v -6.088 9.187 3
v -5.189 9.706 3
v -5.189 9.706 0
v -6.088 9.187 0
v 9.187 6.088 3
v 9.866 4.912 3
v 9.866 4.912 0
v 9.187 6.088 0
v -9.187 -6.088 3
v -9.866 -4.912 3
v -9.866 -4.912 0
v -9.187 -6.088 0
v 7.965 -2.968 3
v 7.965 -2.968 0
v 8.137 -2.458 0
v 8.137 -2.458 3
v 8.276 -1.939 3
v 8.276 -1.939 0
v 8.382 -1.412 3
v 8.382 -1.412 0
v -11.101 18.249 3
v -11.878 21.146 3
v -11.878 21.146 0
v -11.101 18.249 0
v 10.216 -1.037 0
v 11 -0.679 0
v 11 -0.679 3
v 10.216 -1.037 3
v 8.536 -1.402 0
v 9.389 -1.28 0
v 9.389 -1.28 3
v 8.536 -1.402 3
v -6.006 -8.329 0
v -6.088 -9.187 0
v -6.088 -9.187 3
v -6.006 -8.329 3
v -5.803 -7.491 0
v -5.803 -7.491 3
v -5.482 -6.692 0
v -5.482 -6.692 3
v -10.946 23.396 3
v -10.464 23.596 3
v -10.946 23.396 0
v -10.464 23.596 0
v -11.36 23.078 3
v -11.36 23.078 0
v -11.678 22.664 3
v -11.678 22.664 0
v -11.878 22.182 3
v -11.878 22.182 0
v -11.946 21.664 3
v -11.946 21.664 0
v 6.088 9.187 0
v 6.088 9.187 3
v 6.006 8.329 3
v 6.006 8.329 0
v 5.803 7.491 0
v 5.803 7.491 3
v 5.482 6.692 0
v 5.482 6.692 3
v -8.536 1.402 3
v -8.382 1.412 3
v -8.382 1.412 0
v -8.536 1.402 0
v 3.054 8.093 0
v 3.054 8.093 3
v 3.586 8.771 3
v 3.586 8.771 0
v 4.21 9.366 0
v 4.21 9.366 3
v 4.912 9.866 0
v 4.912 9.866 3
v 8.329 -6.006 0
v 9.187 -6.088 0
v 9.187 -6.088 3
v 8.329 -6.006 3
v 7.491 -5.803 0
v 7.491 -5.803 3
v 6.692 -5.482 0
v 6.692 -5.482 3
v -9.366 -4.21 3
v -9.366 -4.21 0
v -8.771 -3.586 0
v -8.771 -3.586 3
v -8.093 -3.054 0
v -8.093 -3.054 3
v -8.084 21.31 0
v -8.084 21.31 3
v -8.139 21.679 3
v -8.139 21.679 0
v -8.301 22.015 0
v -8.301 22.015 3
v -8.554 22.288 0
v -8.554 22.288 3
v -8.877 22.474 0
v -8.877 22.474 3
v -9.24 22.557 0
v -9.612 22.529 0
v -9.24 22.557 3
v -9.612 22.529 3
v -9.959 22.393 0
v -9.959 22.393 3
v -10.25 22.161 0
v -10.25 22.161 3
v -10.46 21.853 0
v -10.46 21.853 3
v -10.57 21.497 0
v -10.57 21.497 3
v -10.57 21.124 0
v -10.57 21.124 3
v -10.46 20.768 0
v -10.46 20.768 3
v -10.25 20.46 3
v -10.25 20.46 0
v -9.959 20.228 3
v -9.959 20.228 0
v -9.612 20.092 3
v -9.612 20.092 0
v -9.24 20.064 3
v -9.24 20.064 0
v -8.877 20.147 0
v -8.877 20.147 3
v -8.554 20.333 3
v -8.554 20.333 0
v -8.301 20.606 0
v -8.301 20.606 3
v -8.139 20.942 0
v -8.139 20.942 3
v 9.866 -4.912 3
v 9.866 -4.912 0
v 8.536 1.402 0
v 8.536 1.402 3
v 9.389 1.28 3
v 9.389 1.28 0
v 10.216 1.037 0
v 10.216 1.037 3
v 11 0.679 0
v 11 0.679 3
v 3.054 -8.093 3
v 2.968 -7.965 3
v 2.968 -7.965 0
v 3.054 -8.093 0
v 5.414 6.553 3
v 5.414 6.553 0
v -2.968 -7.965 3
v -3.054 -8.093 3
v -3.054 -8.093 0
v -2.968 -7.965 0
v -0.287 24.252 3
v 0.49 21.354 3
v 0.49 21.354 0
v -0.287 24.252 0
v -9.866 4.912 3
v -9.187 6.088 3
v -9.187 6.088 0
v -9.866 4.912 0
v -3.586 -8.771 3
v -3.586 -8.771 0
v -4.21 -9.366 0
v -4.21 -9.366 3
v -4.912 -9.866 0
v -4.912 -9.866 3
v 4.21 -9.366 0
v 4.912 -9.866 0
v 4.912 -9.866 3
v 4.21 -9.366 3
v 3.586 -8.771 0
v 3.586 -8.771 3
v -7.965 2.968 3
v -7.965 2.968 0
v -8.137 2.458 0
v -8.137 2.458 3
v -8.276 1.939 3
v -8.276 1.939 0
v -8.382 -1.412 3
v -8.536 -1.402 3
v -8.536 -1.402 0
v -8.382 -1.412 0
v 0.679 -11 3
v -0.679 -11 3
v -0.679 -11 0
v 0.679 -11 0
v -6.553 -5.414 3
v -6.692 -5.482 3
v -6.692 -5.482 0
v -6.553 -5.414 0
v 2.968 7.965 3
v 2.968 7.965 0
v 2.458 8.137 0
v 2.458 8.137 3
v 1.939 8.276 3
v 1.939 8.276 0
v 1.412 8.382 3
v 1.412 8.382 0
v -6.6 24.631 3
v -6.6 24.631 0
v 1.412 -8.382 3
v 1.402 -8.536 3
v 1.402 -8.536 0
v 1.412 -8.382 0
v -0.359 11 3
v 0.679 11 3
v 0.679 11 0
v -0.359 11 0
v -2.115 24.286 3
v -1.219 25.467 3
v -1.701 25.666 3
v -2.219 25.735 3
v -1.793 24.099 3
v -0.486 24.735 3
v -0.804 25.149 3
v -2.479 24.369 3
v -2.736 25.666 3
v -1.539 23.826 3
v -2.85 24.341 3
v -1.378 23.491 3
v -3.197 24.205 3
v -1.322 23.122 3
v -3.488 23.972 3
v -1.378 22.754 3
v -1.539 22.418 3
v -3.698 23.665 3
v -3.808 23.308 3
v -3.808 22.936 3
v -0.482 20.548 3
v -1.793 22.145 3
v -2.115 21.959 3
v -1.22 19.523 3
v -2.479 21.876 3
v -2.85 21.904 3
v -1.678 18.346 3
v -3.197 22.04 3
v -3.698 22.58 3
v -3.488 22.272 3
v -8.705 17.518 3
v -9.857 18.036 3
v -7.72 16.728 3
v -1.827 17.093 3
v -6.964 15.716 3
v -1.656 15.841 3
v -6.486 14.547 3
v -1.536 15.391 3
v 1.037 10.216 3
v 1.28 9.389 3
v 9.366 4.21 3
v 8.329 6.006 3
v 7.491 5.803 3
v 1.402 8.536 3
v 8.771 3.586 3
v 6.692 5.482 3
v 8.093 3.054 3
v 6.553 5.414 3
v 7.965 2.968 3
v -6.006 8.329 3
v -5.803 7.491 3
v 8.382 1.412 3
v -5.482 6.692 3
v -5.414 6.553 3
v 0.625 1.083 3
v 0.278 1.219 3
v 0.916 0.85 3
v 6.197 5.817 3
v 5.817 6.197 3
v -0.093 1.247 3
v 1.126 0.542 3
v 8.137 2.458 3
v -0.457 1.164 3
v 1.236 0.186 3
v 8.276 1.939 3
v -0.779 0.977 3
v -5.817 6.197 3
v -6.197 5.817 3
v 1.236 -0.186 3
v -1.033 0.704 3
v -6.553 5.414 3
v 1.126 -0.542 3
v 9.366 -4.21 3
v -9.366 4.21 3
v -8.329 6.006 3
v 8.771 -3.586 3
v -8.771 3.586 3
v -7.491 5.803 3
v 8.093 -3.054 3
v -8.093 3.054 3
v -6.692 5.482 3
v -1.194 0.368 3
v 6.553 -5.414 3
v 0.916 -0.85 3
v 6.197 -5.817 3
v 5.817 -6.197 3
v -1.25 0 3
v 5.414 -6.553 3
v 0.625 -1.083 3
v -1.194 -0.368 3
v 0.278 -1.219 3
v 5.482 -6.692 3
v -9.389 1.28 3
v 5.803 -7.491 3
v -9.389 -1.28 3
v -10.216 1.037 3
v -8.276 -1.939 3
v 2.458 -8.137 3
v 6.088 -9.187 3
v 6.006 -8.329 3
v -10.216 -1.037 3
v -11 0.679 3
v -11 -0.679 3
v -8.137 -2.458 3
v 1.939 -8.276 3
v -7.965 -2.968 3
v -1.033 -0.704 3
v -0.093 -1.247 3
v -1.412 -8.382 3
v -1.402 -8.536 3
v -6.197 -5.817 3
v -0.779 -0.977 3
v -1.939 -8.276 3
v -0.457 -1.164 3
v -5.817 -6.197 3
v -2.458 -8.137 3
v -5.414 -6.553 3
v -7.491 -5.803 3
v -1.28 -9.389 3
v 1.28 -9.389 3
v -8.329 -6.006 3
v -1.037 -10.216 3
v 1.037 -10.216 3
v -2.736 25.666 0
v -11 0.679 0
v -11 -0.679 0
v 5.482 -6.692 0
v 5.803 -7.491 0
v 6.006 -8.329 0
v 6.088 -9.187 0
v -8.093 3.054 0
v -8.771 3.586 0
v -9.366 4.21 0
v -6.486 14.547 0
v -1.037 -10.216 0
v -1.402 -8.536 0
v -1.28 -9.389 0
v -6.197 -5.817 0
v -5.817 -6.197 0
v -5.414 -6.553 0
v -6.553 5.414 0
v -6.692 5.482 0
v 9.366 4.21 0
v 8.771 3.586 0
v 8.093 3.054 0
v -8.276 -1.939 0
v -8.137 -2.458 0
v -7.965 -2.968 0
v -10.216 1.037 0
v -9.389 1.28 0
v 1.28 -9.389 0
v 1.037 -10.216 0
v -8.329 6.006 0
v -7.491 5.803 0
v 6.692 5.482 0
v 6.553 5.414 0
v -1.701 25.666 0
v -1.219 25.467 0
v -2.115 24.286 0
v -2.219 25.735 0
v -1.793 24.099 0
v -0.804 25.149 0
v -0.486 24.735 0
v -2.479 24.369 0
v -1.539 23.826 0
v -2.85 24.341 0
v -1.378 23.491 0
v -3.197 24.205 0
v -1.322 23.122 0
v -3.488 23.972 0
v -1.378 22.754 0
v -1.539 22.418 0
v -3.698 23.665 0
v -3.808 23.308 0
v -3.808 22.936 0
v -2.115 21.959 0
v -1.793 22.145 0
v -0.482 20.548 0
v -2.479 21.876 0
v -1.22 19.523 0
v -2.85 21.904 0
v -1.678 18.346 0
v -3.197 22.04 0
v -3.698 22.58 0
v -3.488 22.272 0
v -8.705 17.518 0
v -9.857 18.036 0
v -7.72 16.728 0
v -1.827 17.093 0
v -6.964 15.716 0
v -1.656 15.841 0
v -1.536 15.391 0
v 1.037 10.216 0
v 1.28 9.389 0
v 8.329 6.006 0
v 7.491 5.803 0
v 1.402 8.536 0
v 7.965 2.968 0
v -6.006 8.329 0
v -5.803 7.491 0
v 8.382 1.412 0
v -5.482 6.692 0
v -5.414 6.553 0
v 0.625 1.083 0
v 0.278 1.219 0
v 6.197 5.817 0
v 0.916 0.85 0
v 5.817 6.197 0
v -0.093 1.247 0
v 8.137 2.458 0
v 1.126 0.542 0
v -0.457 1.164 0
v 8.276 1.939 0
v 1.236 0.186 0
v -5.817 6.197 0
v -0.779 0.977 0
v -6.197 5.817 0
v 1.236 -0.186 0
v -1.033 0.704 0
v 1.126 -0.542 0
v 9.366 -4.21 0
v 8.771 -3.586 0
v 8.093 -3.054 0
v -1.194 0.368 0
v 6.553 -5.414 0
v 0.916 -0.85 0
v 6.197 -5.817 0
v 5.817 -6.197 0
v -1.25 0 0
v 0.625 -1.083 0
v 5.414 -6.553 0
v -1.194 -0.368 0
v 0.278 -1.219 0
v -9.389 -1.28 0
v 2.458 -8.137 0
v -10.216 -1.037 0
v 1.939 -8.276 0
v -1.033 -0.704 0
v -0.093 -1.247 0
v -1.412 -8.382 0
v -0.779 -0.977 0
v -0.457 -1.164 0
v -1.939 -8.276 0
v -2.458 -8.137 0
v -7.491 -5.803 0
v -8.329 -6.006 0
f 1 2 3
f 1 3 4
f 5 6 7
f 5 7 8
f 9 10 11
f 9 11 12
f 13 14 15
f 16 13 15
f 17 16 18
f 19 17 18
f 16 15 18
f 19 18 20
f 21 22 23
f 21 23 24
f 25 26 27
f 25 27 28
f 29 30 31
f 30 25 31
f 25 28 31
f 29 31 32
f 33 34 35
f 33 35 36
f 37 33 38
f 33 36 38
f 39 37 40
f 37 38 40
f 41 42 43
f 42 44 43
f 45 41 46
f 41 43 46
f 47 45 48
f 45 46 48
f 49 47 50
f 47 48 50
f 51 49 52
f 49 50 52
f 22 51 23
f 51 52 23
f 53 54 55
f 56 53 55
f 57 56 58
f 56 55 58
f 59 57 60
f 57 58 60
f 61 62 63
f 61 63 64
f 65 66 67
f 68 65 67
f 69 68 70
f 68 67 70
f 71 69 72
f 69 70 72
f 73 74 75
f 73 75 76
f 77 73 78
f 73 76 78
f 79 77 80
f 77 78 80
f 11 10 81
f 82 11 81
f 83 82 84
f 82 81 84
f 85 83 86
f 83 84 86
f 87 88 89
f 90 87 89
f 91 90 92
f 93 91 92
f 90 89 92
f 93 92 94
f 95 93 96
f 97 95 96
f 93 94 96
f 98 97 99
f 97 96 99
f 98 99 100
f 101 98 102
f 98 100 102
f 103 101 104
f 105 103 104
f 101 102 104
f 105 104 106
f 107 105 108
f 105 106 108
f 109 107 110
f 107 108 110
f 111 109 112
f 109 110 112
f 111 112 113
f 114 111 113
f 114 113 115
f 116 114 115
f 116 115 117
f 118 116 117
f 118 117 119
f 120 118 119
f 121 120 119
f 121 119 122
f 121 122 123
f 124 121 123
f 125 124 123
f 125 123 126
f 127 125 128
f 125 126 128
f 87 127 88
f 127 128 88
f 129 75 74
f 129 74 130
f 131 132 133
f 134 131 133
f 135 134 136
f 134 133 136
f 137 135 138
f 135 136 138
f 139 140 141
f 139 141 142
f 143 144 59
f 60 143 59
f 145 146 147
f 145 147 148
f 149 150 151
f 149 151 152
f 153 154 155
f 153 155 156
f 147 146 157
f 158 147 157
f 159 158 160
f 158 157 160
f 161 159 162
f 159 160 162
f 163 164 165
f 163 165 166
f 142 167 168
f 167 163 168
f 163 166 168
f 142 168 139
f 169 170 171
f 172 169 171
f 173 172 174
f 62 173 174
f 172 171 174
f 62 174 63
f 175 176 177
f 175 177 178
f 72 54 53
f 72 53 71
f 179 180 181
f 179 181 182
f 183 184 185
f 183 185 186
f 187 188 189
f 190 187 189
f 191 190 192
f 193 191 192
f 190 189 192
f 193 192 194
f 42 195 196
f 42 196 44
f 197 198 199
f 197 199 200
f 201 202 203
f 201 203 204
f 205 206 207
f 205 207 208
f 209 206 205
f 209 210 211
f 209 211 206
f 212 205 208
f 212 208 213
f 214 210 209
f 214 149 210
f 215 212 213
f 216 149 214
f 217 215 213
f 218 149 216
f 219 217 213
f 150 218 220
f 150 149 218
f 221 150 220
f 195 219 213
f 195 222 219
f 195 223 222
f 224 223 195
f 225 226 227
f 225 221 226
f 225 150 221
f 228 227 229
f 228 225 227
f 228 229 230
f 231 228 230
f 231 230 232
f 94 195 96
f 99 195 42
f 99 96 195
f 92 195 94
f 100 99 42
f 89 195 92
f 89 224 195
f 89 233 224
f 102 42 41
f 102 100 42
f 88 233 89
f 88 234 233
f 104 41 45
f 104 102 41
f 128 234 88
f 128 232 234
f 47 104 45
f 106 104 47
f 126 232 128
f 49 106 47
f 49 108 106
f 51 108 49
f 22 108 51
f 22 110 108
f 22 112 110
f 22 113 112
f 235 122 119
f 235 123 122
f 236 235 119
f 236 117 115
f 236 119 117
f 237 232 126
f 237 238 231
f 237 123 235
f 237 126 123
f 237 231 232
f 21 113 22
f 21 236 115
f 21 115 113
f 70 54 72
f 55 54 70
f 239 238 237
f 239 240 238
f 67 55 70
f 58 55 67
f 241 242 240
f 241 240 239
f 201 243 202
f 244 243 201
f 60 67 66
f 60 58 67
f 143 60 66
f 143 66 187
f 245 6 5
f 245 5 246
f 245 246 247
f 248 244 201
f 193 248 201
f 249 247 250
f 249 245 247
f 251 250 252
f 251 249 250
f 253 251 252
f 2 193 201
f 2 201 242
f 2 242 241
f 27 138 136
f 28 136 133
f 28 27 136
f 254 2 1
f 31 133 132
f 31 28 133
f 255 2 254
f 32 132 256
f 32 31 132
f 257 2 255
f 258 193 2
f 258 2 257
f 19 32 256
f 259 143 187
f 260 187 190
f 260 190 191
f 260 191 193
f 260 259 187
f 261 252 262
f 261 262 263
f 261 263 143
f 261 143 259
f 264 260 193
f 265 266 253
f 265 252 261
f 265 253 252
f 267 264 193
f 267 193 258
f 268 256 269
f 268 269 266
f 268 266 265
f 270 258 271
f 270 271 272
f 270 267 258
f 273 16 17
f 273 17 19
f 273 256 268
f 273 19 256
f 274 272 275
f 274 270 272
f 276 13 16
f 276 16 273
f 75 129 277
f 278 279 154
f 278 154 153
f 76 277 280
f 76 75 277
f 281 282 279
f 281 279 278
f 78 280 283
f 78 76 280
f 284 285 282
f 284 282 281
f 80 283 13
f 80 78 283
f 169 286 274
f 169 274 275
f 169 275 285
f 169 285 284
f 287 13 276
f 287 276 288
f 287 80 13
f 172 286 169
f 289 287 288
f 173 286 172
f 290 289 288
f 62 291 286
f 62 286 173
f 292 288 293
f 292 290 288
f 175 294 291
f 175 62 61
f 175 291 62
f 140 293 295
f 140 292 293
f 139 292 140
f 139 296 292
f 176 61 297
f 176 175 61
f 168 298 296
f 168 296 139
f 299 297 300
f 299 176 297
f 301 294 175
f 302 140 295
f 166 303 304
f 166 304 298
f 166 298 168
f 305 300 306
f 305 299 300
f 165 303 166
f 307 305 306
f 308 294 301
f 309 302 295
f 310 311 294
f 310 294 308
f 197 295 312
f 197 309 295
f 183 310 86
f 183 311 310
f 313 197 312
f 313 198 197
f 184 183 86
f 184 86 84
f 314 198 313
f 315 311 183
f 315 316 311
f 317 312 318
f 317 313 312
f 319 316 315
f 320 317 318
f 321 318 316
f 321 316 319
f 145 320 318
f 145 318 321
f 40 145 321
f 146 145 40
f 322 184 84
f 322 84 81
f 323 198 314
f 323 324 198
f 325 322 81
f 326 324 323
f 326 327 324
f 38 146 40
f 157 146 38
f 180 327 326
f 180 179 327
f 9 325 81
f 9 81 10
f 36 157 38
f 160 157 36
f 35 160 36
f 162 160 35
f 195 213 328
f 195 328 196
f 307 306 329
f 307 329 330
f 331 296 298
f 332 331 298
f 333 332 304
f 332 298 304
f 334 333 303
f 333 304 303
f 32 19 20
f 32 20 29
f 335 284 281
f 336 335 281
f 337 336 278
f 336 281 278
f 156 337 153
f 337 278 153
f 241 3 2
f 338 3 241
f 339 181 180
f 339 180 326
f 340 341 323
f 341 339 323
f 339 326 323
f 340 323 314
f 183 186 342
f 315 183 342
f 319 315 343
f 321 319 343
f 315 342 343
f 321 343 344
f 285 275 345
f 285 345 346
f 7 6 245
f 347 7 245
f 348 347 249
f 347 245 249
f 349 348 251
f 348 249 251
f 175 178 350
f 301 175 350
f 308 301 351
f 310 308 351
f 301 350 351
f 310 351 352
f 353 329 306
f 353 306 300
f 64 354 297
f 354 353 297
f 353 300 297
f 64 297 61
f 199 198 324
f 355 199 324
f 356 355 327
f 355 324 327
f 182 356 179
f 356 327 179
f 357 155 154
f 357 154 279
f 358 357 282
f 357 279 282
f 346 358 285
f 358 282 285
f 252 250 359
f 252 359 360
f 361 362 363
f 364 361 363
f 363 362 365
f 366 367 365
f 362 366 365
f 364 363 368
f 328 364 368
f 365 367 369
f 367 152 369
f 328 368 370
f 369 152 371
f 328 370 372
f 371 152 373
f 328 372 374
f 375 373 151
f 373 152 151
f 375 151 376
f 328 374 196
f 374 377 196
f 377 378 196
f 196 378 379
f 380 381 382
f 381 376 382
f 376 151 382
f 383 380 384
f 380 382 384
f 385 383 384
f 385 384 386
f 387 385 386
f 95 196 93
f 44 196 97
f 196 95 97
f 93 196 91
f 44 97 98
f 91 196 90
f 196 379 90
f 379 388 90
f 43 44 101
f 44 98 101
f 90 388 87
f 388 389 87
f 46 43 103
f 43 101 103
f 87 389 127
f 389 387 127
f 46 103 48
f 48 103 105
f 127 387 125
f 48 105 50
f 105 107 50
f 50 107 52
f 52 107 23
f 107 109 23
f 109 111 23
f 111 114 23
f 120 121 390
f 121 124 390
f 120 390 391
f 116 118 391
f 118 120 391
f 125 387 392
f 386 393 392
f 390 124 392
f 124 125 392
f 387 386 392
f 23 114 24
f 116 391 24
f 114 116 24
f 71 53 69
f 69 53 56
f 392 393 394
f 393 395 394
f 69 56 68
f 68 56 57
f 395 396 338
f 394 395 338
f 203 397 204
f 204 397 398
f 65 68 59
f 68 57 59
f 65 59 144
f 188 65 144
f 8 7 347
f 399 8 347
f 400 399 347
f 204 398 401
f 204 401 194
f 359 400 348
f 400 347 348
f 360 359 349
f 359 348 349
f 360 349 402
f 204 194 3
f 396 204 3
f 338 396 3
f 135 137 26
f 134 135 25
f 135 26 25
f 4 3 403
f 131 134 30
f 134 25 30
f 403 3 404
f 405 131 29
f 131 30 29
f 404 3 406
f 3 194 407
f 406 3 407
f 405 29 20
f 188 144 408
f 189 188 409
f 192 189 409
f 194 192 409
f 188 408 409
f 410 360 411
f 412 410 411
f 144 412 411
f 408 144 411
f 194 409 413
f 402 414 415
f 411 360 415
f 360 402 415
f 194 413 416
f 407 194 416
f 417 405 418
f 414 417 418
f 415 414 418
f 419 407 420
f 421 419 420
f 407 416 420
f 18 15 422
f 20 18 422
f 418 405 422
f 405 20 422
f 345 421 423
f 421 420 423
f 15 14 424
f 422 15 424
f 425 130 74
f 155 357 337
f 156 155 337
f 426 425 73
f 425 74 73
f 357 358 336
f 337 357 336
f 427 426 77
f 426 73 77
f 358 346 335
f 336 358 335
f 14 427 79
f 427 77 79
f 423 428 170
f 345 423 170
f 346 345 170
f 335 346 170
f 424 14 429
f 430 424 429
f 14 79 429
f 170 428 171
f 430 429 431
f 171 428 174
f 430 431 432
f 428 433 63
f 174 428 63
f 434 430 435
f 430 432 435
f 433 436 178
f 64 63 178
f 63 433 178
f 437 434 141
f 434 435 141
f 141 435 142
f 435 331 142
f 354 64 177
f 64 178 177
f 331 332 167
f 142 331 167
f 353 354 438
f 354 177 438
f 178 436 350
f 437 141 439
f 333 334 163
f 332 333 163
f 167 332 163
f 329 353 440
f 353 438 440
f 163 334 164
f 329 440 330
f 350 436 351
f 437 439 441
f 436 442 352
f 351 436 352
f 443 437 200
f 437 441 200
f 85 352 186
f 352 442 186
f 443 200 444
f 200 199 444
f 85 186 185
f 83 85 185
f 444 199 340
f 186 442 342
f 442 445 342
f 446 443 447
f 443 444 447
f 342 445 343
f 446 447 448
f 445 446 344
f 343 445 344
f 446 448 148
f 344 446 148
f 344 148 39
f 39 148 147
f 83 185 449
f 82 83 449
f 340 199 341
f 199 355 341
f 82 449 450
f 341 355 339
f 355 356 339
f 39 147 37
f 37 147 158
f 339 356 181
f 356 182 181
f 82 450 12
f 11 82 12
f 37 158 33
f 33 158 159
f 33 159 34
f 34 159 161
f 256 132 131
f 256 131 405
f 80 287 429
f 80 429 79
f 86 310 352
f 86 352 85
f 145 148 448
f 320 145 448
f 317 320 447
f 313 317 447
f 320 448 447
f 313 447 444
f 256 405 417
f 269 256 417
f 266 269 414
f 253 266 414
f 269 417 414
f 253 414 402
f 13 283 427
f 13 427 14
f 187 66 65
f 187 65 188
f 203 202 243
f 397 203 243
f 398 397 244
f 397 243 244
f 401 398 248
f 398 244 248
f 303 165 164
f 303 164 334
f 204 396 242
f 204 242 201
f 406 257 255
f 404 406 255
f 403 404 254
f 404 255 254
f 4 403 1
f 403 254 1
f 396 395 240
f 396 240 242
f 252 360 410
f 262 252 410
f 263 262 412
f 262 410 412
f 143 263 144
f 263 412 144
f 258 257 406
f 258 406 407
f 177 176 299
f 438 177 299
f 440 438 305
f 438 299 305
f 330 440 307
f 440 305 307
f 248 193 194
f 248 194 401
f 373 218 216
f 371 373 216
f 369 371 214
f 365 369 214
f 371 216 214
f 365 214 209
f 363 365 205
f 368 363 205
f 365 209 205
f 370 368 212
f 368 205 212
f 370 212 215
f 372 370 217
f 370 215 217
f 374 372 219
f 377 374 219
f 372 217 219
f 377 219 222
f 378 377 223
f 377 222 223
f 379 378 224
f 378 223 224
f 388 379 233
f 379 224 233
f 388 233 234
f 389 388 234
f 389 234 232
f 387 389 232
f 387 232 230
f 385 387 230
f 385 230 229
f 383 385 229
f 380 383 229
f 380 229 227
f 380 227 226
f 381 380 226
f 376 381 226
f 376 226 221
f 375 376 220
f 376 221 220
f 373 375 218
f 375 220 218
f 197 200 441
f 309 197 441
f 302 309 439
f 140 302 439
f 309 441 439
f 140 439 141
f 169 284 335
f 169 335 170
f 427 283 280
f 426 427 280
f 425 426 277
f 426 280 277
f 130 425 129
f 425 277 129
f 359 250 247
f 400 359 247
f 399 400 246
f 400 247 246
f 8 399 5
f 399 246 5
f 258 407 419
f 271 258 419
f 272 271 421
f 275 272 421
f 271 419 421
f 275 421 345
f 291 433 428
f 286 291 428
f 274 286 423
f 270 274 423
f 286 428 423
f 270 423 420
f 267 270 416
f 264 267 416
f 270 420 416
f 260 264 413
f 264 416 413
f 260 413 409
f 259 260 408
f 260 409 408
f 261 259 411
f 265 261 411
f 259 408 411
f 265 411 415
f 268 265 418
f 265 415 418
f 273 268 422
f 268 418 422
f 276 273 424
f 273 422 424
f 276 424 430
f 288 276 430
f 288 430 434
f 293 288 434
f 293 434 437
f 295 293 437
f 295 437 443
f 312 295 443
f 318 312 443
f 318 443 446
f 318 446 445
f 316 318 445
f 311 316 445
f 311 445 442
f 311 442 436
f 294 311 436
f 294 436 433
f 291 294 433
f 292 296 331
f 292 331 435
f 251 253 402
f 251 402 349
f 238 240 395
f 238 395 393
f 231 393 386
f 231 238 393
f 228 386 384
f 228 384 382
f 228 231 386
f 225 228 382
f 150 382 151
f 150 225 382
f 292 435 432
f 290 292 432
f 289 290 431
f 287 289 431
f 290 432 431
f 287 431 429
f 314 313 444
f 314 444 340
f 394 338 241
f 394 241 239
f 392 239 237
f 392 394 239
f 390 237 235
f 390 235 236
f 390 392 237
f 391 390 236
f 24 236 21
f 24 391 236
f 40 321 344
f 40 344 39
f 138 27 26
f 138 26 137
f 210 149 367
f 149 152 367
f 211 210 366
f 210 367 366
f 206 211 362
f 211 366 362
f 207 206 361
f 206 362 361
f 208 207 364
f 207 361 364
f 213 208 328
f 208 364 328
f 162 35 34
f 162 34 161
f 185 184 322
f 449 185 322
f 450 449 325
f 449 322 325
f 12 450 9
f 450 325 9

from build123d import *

# Parameters (mm, degrees)
SKETCH1_R           = 8.5
BOSS_EXTRUDE1_DEPTH = 3
BOSS_EXTRUDE2_DEPTH = 3
CIRPATTERN2_COUNT   = 12
FILLET5_R           = 6
FILLET6_R           = 6
BOSS_EXTRUDE5_DEPTH = 3
SKETCH15_R          = 5
BOSS_EXTRUDE6_DEPTH = 1.9
SKETCH14_R          = 1.25
CUT_EXTRUDE7_DEPTH  = 28.730582035
SKETCH17_R          = 1.25
CUT_EXTRUDE9_DEPTH  = 28.730582035
FILLET7_R           = 2.5
BOSS_EXTRUDE7_DEPTH = 3
SKETCH20_R          = 1.25
CUT_EXTRUDE10_DEPTH = 3
FILLET8_R           = 5
FILLET9_R           = 5
FILLET10_R          = 2
FILLET11_R          = 2


# Some blends are built 0.0001 mm under size
with BuildPart() as part:
    # Sketch1 → Boss-Extrude1 (new body)
    with BuildSketch(Plane.XY):
        Circle(SKETCH1_R)
    extrude(amount=BOSS_EXTRUDE1_DEPTH)

    # Sketch3 → Boss-Extrude2 (add)
    with BuildSketch(Plane.XY.offset(3)):
        Polygon((-1.305261922, 9.914448614), (-1.509060022, 7), (1.509060022, 7), (1.305261922, 9.914448614), (0.678518537, 11), (-0.678518537, 11), align=None)
    boss_extrude2 = extrude(amount=-BOSS_EXTRUDE2_DEPTH)

    # CirPattern2: Boss-Extrude2 ×12 about axis
    cirpattern2_axis = Axis((0, 0, 0), (0, 0, 1))
    for i in range(1, CIRPATTERN2_COUNT):
        add(boss_extrude2.rotate(cirpattern2_axis, i * 360 / CIRPATTERN2_COUNT))

    # Fillet5
    # the kernel refuses this fillet: 6 mm, written as the material it takes off along each edge
    with BuildSketch(Plane(origin=(9.238795325, 3.826834324, 6.454382408), x_dir=(0.4999999999998129, 0.8660254037845467, 0), z_dir=(0, 0, -1)), Plane(origin=(1.305261922, 9.914448614, 6.454382408), x_dir=(-0.5000000000001841, 0.8660254037843323, 0), z_dir=(0, 0, -1)), Plane(origin=(-7.933533403, 6.08761429, 6.454382408), x_dir=(-1, 0, 0), z_dir=(0, 0, -1)), Plane(origin=(-9.914448614, 1.305261922, 6.454382408), x_dir=(-0.8660254037843317, -0.5000000000001852, 0), z_dir=(0, 0, -1)), Plane(origin=(-9.238795325, -3.826834324, 6.454382408), x_dir=(-0.49999999999981826, -0.8660254037845436, 0), z_dir=(0, 0, -1)), Plane(origin=(-6.08761429, -7.933533403, 6.454382408), x_dir=(0, -1, 0), z_dir=(0, 0, -1)), Plane(origin=(3.826834324, -9.238795325, 6.454382408), x_dir=(0.866025403784545, -0.49999999999981576, 0), z_dir=(0, 0, -1)), Plane(origin=(7.933533403, -6.08761429, 6.454382408), x_dir=(1, 0, 0), z_dir=(0, 0, -1)), Plane(origin=(9.914448614, -1.305261922, 6.454382408), x_dir=(0.8660254037843321, 0.5000000000001844, 0), z_dir=(0, 0, -1))) as fillet5_piece_1:
        with BuildLine():
            CenterArc((1.388315544, -5.998484909), FILLET5_R, 91.287628333, 24.712371667)
            Line((-1.241911337, -0.605720631), (-1.294515874, -0.497865346))
            Line((-1.294515874, -0.497865346), (-0.052604538, 0.107855286))
            Line((-0.052604538, 0.107855286), (0, 0.12))
            ThreePointArc((0, 0.12), (0.626743385, 0.12), (1.250790195, 0.119969698))
            Line((1.250790195, 0.119969698), (1.25348677, 0))
        make_face()
    extrude(amount=9.908764816, mode=Mode.SUBTRACT)
    with BuildSketch(Plane(origin=(6.08761429, 7.933533403, 6.454382408), x_dir=(-0.4383711467890806, -0.8987940462991654, 0), z_dir=(0, 0, -1)), Plane(origin=(-3.826834324, 9.238795325, 6.454382408), x_dir=(0.5591929034707435, -0.8290375725550441, 0), z_dir=(0, 0, -1)), Plane(origin=(-1.305261922, -9.914448614, 6.454382408), x_dir=(-0.06975647374412178, 0.9975640502598244, 0), z_dir=(0, 0, -1))) as fillet5_piece_2:
        with BuildLine():
            CenterArc((1.381752963, 6), FILLET5_R, 245.287628333, 24.712371667)
            Line((-1.126626446, 0.549492433), (-1.176794034, 0.440482282))
            ThreePointArc((-1.176794034, 0.440482282), (-0.615917761, 0.166890931), (-0.052604538, -0.107855286))
            Line((-0.052604538, -0.107855286), (0, -0.12))
            Line((0, -0.12), (1.381752963, -0.12))
            Line((1.381752963, -0.12), (1.381752963, 0))
        make_face()
    extrude(amount=9.908764816, mode=Mode.SUBTRACT)

    # Fillet6
    # the kernel refuses this fillet: 6 mm, written as the material it takes off along each edge
    with BuildSketch(Plane(origin=(7.933533403, 6.08761429, 6.454382408), x_dir=(-0.8987940462991681, -0.4383711467890748, 0), z_dir=(0, 0, -1)), Plane(origin=(3.826834324, 9.238795325, 6.454382408), x_dir=(-0.5591929034707512, -0.8290375725550386, 0), z_dir=(0, 0, -1)), Plane(origin=(-1.305261922, 9.914448614, 6.454382408), x_dir=(-0.06975647374412959, -0.9975640502598239, 0), z_dir=(0, 0, -1)), Plane(origin=(-6.08761429, 7.933533403, 6.454382408), x_dir=(0.43837114678907496, -0.8987940462991681, 0), z_dir=(0, 0, -1)), Plane(origin=(-9.238795325, 3.826834324, 6.454382408), x_dir=(0.8290375725550394, -0.5591929034707502, 0), z_dir=(0, 0, -1)), Plane(origin=(-9.914448614, -1.305261922, 6.454382408), x_dir=(0.9975640502598241, -0.06975647374412908, 0), z_dir=(0, 0, -1)), Plane(origin=(-7.933533403, -6.08761429, 6.454382408), x_dir=(0.8987940462991686, 0.4383711467890744, 0), z_dir=(0, 0, -1)), Plane(origin=(-3.826834324, -9.238795325, 6.454382408), x_dir=(0.559192903470749, 0.8290375725550401, 0), z_dir=(0, 0, -1)), Plane(origin=(1.305261922, -9.914448614, 6.454382408), x_dir=(0.06975647374412973, 0.9975640502598241, 0), z_dir=(0, 0, -1)), Plane(origin=(6.08761429, -7.933533403, 6.454382408), x_dir=(-0.4383711467890742, 0.8987940462991686, 0), z_dir=(0, 0, -1)), Plane(origin=(9.238795325, -3.826834324, 6.454382408), x_dir=(-0.8290375725550386, 0.5591929034707512, 0), z_dir=(0, 0, -1)), Plane(origin=(9.914448614, 1.305261922, 6.454382408), x_dir=(-0.9975640502598239, 0.06975647374412945, 0), z_dir=(0, 0, -1))) as fillet6_piece_1:
        with BuildLine():
            CenterArc((1.381752963, -6), FILLET6_R, 90, 24.712371667)
            Line((-1.126626446, -0.549492433), (-1.176794034, -0.440482282))
            ThreePointArc((-1.176794034, -0.440482282), (-0.615917761, -0.166890931), (-0.052604538, 0.107855286))
            Line((-0.052604538, 0.107855286), (0, 0.12))
            Line((0, 0.12), (1.381752963, 0.12))
            Line((1.381752963, 0.12), (1.381752963, 0))
        make_face()
    extrude(amount=9.908764816, mode=Mode.SUBTRACT)

    # Sketch12 → Boss-Extrude5 (add)
    with BuildSketch(Plane(origin=(0, 0, 0), x_dir=(-1, 0, 0), z_dir=(0, 0, -1))):
        Polygon((1.535905814, 15.391336798), (-4.226547881, -6.114433171), (0.60308125, -7.408528397), (9.014700216, 23.984060958), (4.185071084, 25.278156183), align=None)
    extrude(amount=-BOSS_EXTRUDE5_DEPTH)

    # Sketch15 → Boss-Extrude6 (add)
    with BuildSketch(Plane(origin=(0, 0, 0), x_dir=(-1, 0, 0), z_dir=(0, 0, -1))):
        Circle(SKETCH15_R)
    extrude(amount=-BOSS_EXTRUDE6_DEPTH)

    # Sketch14 → Cut-Extrude7 (cut, through all)
    with BuildSketch(Plane(origin=(0, 0, 0), x_dir=(-1, 0, 0), z_dir=(0, 0, -1))):
        Circle(SKETCH14_R)
    extrude(amount=-CUT_EXTRUDE7_DEPTH, mode=Mode.SUBTRACT)

    # Sketch17 → Cut-Extrude9 (cut, through all)
    with BuildSketch(Plane.XY.offset(3)):
        with Locations((-5.952838037, 22.216294005)):
            Circle(SKETCH17_R)
    extrude(amount=-CUT_EXTRUDE9_DEPTH, mode=Mode.SUBTRACT)

    # Fillet7
    fillet7_edges = [part.edges().sort_by_distance(p)[0] for p in [
        (-9.014700216, 23.984060958, 1.5),
        (-4.185071084, 25.278156183, 1.5),
    ]]
    fillet(fillet7_edges, radius=FILLET7_R - 0.0001)  # a hair under: the kernel refuses the full size

    # Sketch19 → Boss-Extrude7 (add)
    with BuildSketch(Plane.XY.offset(3)):
        Polygon((-6.59988565, 24.63110857), (-12.395440608, 23.0781943), (-11.101345382, 18.248565168), (0.489764533, 21.35439371), (-0.804330692, 26.184022841), align=None)
    extrude(amount=-BOSS_EXTRUDE7_DEPTH)

    # Sketch20 → Cut-Extrude10 (cut)
    with BuildSketch(Plane.XY.offset(3)):
        with Locations((-9.333578429, 21.310427347)):
            Circle(SKETCH20_R)
        with Locations((-2.572097645, 23.122160663)):
            Circle(SKETCH20_R)
    extrude(amount=-CUT_EXTRUDE10_DEPTH, mode=Mode.SUBTRACT)

    # Fillet8
    # the kernel refuses this fillet: 5 mm, written as the material it adds along each edge
    with BuildSketch(Plane(origin=(-7.72060499, 19.154431826, 0), x_dir=(-0.9659258262890523, -0.25881904510258064, 0), z_dir=(0, 0, 1))) as fillet8_piece_1:
        with BuildLine():
            CenterArc((5, 4.769696007), FILLET8_R, 180, 72.542396876)
            Line((0, 4.769696007), (-0.1, 4.769696007))
            Line((-0.1, 4.769696007), (-0.1, 0))
            Line((-0.1, 0), (0, -0.1))
            ThreePointArc((0, -0.1), (1.75, -0.1), (3.47, -0.09539392))
            Line((3.47, -0.09539392), (3.5, 0))
        make_face()
    extrude(amount=3)

    # Fillet9
    # the kernel refuses this fillet: 5 mm, written as the material it adds along each edge
    with BuildSketch(Plane(origin=(-2.890975859, 20.448527052, 3), x_dir=(0.9659258262890524, 0.25881904510257997, 0), z_dir=(0, 0, -1))) as fillet9_piece_1:
        with BuildLine():
            CenterArc((5, 4.769696007), FILLET9_R, 180, 72.542396876)
            Line((0, 4.769696007), (-0.1, 4.769696007))
            Line((-0.1, 4.769696007), (-0.1, 0))
            Line((-0.1, 0), (0, -0.1))
            ThreePointArc((0, -0.1), (1.75, -0.1), (3.47, -0.09539392))
            Line((3.47, -0.09539392), (3.5, 0))
        make_face()
    extrude(amount=3)

    # Fillet10
    fillet10_edges = [part.edges().sort_by_distance(p)[0] for p in [
        (-0.804330692, 26.184022841, 1.5),
    ]]
    fillet(fillet10_edges, radius=FILLET10_R)

    # Fillet11
    fillet11_edges = [part.edges().sort_by_distance(p)[0] for p in [
        (-12.395440608, 23.0781943, 1.5),
    ]]
    fillet(fillet11_edges, radius=FILLET11_R)


solid = part.part
